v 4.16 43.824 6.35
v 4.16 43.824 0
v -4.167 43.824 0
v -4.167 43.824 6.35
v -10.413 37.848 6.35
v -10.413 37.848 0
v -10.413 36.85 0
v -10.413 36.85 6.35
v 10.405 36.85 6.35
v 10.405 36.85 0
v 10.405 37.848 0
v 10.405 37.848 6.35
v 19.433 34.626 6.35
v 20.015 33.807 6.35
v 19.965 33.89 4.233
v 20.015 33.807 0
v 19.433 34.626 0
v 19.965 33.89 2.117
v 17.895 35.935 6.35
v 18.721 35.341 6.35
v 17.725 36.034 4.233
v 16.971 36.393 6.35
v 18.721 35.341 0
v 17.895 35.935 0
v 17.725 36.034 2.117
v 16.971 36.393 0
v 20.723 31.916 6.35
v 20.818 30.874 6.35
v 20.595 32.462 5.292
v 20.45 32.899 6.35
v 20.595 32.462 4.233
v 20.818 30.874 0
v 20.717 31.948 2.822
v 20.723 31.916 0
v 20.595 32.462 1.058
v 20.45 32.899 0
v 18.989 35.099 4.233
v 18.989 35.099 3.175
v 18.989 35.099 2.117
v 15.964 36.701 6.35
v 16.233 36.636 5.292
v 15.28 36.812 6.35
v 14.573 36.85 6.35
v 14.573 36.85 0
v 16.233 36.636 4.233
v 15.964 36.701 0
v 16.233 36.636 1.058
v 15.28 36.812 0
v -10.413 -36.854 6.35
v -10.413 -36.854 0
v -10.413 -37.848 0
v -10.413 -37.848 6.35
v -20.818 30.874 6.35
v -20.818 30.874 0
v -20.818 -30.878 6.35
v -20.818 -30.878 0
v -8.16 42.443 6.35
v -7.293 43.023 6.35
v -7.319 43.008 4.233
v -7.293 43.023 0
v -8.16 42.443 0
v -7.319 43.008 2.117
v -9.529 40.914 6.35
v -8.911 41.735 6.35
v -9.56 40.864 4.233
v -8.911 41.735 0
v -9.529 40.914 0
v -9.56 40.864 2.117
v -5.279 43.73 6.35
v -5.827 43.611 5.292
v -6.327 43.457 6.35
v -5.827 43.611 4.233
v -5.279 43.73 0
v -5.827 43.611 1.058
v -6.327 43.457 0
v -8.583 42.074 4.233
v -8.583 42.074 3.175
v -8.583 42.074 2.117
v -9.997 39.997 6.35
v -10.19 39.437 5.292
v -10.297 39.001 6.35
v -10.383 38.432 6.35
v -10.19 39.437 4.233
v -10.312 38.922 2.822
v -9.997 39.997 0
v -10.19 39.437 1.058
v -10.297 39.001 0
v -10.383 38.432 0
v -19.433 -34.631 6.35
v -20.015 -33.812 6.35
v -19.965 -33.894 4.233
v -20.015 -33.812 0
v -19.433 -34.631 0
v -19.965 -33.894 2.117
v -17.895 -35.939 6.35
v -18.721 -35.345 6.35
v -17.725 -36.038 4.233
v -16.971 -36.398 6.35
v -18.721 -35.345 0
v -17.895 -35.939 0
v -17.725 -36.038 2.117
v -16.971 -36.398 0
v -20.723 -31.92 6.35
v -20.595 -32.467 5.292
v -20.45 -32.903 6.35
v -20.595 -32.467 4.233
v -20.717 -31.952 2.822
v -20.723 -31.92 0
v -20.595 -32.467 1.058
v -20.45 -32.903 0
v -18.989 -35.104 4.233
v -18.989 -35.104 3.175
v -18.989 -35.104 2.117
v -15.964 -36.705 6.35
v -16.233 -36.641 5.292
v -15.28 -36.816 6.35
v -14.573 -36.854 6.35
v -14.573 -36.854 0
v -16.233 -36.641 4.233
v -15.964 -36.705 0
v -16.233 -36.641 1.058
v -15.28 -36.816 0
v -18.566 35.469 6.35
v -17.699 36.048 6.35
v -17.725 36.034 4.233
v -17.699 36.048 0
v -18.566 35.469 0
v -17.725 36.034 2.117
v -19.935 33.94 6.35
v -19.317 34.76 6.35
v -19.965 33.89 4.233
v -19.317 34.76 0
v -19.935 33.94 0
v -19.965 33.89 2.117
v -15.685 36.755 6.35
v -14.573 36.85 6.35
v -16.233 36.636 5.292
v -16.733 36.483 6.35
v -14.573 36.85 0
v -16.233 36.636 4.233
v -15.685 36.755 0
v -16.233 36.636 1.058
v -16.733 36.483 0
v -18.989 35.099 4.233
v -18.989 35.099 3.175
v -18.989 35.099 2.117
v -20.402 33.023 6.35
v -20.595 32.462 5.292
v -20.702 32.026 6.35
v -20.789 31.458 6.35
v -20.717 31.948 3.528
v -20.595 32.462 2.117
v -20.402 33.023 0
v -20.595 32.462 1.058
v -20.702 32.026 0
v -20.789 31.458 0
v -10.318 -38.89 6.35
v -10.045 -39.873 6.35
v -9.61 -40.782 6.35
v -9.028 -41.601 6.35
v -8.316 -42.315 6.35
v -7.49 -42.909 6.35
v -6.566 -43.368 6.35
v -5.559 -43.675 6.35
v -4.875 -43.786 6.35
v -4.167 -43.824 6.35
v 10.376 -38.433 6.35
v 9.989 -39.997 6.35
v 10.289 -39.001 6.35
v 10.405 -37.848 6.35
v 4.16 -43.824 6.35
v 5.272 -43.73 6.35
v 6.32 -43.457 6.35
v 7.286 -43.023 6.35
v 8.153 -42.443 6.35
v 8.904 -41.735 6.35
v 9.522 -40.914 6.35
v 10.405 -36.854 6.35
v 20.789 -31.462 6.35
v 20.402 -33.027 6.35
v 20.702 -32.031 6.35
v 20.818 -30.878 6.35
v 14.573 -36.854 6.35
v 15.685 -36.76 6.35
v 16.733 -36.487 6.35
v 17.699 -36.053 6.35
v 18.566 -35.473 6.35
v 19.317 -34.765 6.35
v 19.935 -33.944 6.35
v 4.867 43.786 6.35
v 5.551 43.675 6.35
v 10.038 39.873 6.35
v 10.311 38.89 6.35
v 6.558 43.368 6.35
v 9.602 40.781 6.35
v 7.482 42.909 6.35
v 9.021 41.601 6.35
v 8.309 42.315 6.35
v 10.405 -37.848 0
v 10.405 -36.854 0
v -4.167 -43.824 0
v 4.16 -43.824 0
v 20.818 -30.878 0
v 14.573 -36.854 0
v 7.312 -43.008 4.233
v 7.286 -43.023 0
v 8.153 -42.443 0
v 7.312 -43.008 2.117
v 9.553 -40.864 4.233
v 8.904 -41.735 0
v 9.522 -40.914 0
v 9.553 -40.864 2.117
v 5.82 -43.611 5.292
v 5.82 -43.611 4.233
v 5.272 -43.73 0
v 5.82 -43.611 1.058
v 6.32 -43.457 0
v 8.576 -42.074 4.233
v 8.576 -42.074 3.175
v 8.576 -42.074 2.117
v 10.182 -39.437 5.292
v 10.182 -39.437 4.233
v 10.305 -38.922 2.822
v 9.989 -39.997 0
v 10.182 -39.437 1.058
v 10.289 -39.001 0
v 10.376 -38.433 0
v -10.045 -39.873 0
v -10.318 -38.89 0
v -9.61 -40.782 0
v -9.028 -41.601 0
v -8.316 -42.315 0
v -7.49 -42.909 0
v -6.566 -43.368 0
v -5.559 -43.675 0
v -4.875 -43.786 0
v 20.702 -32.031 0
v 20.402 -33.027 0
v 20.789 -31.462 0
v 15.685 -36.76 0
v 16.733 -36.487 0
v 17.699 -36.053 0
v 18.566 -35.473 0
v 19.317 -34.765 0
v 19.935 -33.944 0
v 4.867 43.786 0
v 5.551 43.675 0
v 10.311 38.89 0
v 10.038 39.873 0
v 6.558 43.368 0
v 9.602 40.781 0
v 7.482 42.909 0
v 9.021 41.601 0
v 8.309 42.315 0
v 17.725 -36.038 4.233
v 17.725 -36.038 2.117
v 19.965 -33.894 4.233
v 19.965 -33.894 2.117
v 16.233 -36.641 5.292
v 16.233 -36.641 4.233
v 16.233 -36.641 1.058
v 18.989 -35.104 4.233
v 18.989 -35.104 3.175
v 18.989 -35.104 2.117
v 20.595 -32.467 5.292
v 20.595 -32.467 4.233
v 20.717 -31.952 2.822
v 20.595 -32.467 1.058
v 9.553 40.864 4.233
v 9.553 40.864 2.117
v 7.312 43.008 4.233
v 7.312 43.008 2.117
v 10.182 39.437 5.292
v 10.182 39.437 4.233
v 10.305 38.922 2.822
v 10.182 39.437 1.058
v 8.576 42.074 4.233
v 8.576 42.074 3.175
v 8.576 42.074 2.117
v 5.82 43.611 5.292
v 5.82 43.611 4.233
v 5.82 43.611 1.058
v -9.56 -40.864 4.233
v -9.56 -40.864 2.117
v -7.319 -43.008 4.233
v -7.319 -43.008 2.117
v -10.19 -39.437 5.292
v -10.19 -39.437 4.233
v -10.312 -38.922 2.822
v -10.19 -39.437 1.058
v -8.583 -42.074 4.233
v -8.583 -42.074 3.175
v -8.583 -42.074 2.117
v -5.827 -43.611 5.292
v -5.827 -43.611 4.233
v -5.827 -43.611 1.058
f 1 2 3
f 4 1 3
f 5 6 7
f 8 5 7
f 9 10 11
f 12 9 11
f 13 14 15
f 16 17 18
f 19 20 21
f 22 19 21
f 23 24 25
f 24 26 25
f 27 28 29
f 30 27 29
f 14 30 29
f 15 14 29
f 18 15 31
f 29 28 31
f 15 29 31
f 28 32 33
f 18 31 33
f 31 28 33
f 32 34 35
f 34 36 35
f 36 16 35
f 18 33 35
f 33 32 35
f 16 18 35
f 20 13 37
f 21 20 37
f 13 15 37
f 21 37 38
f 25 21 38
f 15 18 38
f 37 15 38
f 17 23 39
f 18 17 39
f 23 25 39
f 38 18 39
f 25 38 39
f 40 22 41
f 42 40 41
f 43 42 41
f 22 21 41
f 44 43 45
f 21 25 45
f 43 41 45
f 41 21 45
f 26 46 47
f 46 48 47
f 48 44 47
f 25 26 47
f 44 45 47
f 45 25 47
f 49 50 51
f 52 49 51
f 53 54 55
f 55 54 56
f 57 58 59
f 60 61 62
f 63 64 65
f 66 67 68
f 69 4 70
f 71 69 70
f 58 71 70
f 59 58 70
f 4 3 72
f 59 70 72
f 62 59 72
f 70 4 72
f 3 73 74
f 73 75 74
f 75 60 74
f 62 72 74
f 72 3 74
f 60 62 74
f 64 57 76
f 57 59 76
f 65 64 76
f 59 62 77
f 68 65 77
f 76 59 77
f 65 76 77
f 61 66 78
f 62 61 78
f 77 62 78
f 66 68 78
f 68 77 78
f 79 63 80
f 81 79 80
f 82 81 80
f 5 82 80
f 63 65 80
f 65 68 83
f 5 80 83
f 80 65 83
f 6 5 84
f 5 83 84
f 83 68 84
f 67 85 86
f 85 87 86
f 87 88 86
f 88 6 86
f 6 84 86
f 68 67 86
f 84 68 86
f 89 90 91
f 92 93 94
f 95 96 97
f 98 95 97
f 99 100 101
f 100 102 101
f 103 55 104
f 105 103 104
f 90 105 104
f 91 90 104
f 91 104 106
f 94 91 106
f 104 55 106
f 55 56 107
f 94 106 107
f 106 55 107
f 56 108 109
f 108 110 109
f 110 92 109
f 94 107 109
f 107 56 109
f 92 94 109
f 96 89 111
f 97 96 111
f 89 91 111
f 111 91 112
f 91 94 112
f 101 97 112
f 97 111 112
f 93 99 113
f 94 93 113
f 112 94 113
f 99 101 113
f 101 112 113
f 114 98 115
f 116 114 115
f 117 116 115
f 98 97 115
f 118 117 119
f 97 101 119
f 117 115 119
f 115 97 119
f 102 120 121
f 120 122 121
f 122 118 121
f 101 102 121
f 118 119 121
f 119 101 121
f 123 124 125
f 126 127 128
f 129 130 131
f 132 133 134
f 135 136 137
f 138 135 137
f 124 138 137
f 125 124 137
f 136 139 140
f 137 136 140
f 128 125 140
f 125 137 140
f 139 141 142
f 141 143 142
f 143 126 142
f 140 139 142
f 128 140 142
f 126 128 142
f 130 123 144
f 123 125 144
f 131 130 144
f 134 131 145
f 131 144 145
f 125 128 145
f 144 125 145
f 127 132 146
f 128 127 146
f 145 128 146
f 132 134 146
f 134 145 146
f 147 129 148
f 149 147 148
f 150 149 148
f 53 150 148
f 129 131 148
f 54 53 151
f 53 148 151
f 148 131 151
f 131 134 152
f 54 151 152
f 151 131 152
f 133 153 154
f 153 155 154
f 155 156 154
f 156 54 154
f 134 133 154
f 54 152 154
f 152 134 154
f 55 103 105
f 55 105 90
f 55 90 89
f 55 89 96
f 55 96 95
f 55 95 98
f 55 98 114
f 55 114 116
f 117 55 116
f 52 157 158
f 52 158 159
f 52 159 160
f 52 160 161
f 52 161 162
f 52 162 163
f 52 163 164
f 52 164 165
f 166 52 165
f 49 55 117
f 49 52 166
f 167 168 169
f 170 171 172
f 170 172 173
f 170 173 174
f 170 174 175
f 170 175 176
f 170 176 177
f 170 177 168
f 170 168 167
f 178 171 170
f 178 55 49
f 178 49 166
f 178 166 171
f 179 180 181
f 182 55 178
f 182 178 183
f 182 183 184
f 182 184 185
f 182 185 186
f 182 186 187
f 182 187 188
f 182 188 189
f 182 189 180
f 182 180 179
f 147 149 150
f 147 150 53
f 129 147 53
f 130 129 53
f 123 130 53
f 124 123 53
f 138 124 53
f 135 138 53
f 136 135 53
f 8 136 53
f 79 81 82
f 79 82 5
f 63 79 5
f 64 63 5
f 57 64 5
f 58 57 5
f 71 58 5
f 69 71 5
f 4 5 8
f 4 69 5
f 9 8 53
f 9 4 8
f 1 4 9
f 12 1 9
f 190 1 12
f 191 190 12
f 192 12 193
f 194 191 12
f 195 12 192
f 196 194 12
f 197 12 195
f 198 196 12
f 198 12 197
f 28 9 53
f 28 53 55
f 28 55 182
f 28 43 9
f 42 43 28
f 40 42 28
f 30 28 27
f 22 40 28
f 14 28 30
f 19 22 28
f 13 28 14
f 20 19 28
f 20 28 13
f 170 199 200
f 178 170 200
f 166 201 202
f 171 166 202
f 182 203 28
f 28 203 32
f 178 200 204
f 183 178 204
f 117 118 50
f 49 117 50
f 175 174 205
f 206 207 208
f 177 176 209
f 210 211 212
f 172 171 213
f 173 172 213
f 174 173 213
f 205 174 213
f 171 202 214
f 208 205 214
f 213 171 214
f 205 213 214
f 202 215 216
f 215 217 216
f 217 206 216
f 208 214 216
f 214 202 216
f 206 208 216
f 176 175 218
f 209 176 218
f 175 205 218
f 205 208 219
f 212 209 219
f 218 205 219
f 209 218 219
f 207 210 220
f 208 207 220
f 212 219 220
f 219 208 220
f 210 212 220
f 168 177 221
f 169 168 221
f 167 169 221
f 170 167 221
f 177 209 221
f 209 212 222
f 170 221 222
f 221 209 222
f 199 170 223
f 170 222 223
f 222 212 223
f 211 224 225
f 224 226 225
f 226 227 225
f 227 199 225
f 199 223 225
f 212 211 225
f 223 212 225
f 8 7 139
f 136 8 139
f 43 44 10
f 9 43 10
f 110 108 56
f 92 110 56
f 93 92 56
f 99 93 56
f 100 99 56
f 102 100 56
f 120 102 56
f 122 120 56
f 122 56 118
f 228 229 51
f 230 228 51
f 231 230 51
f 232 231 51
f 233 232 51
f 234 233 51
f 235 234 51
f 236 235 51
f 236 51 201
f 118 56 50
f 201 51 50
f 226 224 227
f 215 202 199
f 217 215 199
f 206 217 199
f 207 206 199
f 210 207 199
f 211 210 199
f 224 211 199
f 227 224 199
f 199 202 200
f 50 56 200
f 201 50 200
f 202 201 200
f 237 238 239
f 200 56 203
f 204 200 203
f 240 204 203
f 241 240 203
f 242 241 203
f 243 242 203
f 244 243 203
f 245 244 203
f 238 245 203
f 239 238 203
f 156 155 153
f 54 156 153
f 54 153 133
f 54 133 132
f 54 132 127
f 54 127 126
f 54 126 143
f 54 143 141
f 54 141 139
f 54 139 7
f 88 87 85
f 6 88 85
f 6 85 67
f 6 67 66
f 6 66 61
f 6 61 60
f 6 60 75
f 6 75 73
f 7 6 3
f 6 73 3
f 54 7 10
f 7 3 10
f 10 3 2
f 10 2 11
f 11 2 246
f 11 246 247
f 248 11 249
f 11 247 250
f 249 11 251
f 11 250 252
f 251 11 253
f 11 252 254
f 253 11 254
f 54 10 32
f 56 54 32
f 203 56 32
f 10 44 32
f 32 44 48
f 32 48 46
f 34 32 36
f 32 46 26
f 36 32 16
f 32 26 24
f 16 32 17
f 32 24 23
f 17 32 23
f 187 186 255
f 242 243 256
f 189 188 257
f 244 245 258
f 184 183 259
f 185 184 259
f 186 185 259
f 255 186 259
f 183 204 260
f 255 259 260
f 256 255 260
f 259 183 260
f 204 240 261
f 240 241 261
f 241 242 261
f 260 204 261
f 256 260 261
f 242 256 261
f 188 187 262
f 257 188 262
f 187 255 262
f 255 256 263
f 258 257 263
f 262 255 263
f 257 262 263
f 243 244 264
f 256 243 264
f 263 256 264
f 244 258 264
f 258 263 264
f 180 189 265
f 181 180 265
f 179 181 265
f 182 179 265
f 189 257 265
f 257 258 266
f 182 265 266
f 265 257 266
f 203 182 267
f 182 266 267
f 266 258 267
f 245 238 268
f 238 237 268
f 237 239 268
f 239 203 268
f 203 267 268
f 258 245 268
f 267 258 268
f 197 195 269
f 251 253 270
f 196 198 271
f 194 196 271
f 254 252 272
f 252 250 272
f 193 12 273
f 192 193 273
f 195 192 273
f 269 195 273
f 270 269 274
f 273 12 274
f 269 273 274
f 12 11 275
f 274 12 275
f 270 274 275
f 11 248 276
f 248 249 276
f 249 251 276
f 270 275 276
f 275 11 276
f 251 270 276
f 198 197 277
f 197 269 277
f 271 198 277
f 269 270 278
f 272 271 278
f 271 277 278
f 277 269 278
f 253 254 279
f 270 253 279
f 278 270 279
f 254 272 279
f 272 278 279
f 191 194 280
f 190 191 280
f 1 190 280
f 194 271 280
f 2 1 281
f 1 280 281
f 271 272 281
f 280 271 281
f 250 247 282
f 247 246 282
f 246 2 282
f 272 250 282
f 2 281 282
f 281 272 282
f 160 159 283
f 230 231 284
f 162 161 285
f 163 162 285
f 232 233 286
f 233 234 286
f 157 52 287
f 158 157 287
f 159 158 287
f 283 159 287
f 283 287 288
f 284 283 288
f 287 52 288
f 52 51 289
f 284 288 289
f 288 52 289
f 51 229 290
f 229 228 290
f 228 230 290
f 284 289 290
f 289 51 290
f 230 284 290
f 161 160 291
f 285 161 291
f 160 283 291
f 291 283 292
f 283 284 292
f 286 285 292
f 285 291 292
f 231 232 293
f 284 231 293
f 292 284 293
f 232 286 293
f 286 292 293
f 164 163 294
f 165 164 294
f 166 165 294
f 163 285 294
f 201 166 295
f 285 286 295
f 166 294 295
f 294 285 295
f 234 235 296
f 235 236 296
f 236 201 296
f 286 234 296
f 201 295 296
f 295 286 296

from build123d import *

# Parameters (mm, degrees)
F1_DEPTH = 6.35


with BuildPart() as f1:
    # F0 (on Top) → F1 (new body)
    with BuildSketch(Plane.XY):
        with BuildLine():
            add(Edge.make_bspline(
                [(-4.167193, 43.824071), (-7.616309, 43.824071), (-10.412782, 41.148246), (-10.412782, 37.848004)],
                knots=[0, 0, 0, 0, 1, 1, 1, 1], degree=3))
            Line((-10.412782, 37.848004), (-10.412782, 36.849643))
            Line((-10.412782, 36.849643), (-14.572746, 36.849643))
            add(Edge.make_bspline(
                [(-14.572746, 36.849643), (-18.021507, 36.849643), (-20.817982, 34.174171), (-20.817982, 30.873929)],
                knots=[0, 0, 0, 0, 1, 1, 1, 1], degree=3))
            Line((-20.817982, 30.873929), (-20.817982, -30.878161))
            add(Edge.make_bspline(
                [(-20.817982, -30.878161), (-20.817982, -34.178759), (-18.021507, -36.854228), (-14.572746, -36.854228)],
                knots=[0, 0, 0, 0, 1, 1, 1, 1], degree=3))
            Line((-14.572746, -36.854228), (-10.412782, -36.854228))
            Line((-10.412782, -36.854228), (-10.412782, -37.848356))
            add(Edge.make_bspline(
                [(-10.412782, -37.848356), (-10.412782, -41.148598), (-7.616309, -43.82407), (-4.167193, -43.82407)],
                knots=[0, 0, 0, 0, 1, 1, 1, 1], degree=3))
            Line((-4.167193, -43.82407), (4.160141, -43.82407))
            add(Edge.make_bspline(
                [(4.160141, -43.82407), (7.609255, -43.82407), (10.405374, -41.148598), (10.405374, -37.848356)],
                knots=[0, 0, 0, 0, 1, 1, 1, 1], degree=3))
            Line((10.405374, -37.848356), (10.405374, -36.854228))
            Line((10.405374, -36.854228), (14.572747, -36.854228))
            add(Edge.make_bspline(
                [(14.572747, -36.854228), (18.021861, -36.854228), (20.817983, -34.178759), (20.817983, -30.878161)],
                knots=[0, 0, 0, 0, 1, 1, 1, 1], degree=3))
            Line((20.817983, -30.878161), (20.817983, 30.873929))
            add(Edge.make_bspline(
                [(20.817983, 30.873929), (20.817983, 34.174171), (18.021861, 36.849643), (14.572747, 36.849643)],
                knots=[0, 0, 0, 0, 1, 1, 1, 1], degree=3))
            Line((14.572747, 36.849643), (10.405374, 36.849643))
            Line((10.405374, 36.849643), (10.405374, 37.848004))
            add(Edge.make_bspline(
                [(10.405374, 37.848004), (10.405374, 41.148246), (7.609255, 43.824071), (4.160141, 43.824071)],
                knots=[0, 0, 0, 0, 1, 1, 1, 1], degree=3))
            Line((4.160141, 43.824071), (-4.167193, 43.824071))
        make_face()
    extrude(amount=F1_DEPTH)


solid = f1.part
